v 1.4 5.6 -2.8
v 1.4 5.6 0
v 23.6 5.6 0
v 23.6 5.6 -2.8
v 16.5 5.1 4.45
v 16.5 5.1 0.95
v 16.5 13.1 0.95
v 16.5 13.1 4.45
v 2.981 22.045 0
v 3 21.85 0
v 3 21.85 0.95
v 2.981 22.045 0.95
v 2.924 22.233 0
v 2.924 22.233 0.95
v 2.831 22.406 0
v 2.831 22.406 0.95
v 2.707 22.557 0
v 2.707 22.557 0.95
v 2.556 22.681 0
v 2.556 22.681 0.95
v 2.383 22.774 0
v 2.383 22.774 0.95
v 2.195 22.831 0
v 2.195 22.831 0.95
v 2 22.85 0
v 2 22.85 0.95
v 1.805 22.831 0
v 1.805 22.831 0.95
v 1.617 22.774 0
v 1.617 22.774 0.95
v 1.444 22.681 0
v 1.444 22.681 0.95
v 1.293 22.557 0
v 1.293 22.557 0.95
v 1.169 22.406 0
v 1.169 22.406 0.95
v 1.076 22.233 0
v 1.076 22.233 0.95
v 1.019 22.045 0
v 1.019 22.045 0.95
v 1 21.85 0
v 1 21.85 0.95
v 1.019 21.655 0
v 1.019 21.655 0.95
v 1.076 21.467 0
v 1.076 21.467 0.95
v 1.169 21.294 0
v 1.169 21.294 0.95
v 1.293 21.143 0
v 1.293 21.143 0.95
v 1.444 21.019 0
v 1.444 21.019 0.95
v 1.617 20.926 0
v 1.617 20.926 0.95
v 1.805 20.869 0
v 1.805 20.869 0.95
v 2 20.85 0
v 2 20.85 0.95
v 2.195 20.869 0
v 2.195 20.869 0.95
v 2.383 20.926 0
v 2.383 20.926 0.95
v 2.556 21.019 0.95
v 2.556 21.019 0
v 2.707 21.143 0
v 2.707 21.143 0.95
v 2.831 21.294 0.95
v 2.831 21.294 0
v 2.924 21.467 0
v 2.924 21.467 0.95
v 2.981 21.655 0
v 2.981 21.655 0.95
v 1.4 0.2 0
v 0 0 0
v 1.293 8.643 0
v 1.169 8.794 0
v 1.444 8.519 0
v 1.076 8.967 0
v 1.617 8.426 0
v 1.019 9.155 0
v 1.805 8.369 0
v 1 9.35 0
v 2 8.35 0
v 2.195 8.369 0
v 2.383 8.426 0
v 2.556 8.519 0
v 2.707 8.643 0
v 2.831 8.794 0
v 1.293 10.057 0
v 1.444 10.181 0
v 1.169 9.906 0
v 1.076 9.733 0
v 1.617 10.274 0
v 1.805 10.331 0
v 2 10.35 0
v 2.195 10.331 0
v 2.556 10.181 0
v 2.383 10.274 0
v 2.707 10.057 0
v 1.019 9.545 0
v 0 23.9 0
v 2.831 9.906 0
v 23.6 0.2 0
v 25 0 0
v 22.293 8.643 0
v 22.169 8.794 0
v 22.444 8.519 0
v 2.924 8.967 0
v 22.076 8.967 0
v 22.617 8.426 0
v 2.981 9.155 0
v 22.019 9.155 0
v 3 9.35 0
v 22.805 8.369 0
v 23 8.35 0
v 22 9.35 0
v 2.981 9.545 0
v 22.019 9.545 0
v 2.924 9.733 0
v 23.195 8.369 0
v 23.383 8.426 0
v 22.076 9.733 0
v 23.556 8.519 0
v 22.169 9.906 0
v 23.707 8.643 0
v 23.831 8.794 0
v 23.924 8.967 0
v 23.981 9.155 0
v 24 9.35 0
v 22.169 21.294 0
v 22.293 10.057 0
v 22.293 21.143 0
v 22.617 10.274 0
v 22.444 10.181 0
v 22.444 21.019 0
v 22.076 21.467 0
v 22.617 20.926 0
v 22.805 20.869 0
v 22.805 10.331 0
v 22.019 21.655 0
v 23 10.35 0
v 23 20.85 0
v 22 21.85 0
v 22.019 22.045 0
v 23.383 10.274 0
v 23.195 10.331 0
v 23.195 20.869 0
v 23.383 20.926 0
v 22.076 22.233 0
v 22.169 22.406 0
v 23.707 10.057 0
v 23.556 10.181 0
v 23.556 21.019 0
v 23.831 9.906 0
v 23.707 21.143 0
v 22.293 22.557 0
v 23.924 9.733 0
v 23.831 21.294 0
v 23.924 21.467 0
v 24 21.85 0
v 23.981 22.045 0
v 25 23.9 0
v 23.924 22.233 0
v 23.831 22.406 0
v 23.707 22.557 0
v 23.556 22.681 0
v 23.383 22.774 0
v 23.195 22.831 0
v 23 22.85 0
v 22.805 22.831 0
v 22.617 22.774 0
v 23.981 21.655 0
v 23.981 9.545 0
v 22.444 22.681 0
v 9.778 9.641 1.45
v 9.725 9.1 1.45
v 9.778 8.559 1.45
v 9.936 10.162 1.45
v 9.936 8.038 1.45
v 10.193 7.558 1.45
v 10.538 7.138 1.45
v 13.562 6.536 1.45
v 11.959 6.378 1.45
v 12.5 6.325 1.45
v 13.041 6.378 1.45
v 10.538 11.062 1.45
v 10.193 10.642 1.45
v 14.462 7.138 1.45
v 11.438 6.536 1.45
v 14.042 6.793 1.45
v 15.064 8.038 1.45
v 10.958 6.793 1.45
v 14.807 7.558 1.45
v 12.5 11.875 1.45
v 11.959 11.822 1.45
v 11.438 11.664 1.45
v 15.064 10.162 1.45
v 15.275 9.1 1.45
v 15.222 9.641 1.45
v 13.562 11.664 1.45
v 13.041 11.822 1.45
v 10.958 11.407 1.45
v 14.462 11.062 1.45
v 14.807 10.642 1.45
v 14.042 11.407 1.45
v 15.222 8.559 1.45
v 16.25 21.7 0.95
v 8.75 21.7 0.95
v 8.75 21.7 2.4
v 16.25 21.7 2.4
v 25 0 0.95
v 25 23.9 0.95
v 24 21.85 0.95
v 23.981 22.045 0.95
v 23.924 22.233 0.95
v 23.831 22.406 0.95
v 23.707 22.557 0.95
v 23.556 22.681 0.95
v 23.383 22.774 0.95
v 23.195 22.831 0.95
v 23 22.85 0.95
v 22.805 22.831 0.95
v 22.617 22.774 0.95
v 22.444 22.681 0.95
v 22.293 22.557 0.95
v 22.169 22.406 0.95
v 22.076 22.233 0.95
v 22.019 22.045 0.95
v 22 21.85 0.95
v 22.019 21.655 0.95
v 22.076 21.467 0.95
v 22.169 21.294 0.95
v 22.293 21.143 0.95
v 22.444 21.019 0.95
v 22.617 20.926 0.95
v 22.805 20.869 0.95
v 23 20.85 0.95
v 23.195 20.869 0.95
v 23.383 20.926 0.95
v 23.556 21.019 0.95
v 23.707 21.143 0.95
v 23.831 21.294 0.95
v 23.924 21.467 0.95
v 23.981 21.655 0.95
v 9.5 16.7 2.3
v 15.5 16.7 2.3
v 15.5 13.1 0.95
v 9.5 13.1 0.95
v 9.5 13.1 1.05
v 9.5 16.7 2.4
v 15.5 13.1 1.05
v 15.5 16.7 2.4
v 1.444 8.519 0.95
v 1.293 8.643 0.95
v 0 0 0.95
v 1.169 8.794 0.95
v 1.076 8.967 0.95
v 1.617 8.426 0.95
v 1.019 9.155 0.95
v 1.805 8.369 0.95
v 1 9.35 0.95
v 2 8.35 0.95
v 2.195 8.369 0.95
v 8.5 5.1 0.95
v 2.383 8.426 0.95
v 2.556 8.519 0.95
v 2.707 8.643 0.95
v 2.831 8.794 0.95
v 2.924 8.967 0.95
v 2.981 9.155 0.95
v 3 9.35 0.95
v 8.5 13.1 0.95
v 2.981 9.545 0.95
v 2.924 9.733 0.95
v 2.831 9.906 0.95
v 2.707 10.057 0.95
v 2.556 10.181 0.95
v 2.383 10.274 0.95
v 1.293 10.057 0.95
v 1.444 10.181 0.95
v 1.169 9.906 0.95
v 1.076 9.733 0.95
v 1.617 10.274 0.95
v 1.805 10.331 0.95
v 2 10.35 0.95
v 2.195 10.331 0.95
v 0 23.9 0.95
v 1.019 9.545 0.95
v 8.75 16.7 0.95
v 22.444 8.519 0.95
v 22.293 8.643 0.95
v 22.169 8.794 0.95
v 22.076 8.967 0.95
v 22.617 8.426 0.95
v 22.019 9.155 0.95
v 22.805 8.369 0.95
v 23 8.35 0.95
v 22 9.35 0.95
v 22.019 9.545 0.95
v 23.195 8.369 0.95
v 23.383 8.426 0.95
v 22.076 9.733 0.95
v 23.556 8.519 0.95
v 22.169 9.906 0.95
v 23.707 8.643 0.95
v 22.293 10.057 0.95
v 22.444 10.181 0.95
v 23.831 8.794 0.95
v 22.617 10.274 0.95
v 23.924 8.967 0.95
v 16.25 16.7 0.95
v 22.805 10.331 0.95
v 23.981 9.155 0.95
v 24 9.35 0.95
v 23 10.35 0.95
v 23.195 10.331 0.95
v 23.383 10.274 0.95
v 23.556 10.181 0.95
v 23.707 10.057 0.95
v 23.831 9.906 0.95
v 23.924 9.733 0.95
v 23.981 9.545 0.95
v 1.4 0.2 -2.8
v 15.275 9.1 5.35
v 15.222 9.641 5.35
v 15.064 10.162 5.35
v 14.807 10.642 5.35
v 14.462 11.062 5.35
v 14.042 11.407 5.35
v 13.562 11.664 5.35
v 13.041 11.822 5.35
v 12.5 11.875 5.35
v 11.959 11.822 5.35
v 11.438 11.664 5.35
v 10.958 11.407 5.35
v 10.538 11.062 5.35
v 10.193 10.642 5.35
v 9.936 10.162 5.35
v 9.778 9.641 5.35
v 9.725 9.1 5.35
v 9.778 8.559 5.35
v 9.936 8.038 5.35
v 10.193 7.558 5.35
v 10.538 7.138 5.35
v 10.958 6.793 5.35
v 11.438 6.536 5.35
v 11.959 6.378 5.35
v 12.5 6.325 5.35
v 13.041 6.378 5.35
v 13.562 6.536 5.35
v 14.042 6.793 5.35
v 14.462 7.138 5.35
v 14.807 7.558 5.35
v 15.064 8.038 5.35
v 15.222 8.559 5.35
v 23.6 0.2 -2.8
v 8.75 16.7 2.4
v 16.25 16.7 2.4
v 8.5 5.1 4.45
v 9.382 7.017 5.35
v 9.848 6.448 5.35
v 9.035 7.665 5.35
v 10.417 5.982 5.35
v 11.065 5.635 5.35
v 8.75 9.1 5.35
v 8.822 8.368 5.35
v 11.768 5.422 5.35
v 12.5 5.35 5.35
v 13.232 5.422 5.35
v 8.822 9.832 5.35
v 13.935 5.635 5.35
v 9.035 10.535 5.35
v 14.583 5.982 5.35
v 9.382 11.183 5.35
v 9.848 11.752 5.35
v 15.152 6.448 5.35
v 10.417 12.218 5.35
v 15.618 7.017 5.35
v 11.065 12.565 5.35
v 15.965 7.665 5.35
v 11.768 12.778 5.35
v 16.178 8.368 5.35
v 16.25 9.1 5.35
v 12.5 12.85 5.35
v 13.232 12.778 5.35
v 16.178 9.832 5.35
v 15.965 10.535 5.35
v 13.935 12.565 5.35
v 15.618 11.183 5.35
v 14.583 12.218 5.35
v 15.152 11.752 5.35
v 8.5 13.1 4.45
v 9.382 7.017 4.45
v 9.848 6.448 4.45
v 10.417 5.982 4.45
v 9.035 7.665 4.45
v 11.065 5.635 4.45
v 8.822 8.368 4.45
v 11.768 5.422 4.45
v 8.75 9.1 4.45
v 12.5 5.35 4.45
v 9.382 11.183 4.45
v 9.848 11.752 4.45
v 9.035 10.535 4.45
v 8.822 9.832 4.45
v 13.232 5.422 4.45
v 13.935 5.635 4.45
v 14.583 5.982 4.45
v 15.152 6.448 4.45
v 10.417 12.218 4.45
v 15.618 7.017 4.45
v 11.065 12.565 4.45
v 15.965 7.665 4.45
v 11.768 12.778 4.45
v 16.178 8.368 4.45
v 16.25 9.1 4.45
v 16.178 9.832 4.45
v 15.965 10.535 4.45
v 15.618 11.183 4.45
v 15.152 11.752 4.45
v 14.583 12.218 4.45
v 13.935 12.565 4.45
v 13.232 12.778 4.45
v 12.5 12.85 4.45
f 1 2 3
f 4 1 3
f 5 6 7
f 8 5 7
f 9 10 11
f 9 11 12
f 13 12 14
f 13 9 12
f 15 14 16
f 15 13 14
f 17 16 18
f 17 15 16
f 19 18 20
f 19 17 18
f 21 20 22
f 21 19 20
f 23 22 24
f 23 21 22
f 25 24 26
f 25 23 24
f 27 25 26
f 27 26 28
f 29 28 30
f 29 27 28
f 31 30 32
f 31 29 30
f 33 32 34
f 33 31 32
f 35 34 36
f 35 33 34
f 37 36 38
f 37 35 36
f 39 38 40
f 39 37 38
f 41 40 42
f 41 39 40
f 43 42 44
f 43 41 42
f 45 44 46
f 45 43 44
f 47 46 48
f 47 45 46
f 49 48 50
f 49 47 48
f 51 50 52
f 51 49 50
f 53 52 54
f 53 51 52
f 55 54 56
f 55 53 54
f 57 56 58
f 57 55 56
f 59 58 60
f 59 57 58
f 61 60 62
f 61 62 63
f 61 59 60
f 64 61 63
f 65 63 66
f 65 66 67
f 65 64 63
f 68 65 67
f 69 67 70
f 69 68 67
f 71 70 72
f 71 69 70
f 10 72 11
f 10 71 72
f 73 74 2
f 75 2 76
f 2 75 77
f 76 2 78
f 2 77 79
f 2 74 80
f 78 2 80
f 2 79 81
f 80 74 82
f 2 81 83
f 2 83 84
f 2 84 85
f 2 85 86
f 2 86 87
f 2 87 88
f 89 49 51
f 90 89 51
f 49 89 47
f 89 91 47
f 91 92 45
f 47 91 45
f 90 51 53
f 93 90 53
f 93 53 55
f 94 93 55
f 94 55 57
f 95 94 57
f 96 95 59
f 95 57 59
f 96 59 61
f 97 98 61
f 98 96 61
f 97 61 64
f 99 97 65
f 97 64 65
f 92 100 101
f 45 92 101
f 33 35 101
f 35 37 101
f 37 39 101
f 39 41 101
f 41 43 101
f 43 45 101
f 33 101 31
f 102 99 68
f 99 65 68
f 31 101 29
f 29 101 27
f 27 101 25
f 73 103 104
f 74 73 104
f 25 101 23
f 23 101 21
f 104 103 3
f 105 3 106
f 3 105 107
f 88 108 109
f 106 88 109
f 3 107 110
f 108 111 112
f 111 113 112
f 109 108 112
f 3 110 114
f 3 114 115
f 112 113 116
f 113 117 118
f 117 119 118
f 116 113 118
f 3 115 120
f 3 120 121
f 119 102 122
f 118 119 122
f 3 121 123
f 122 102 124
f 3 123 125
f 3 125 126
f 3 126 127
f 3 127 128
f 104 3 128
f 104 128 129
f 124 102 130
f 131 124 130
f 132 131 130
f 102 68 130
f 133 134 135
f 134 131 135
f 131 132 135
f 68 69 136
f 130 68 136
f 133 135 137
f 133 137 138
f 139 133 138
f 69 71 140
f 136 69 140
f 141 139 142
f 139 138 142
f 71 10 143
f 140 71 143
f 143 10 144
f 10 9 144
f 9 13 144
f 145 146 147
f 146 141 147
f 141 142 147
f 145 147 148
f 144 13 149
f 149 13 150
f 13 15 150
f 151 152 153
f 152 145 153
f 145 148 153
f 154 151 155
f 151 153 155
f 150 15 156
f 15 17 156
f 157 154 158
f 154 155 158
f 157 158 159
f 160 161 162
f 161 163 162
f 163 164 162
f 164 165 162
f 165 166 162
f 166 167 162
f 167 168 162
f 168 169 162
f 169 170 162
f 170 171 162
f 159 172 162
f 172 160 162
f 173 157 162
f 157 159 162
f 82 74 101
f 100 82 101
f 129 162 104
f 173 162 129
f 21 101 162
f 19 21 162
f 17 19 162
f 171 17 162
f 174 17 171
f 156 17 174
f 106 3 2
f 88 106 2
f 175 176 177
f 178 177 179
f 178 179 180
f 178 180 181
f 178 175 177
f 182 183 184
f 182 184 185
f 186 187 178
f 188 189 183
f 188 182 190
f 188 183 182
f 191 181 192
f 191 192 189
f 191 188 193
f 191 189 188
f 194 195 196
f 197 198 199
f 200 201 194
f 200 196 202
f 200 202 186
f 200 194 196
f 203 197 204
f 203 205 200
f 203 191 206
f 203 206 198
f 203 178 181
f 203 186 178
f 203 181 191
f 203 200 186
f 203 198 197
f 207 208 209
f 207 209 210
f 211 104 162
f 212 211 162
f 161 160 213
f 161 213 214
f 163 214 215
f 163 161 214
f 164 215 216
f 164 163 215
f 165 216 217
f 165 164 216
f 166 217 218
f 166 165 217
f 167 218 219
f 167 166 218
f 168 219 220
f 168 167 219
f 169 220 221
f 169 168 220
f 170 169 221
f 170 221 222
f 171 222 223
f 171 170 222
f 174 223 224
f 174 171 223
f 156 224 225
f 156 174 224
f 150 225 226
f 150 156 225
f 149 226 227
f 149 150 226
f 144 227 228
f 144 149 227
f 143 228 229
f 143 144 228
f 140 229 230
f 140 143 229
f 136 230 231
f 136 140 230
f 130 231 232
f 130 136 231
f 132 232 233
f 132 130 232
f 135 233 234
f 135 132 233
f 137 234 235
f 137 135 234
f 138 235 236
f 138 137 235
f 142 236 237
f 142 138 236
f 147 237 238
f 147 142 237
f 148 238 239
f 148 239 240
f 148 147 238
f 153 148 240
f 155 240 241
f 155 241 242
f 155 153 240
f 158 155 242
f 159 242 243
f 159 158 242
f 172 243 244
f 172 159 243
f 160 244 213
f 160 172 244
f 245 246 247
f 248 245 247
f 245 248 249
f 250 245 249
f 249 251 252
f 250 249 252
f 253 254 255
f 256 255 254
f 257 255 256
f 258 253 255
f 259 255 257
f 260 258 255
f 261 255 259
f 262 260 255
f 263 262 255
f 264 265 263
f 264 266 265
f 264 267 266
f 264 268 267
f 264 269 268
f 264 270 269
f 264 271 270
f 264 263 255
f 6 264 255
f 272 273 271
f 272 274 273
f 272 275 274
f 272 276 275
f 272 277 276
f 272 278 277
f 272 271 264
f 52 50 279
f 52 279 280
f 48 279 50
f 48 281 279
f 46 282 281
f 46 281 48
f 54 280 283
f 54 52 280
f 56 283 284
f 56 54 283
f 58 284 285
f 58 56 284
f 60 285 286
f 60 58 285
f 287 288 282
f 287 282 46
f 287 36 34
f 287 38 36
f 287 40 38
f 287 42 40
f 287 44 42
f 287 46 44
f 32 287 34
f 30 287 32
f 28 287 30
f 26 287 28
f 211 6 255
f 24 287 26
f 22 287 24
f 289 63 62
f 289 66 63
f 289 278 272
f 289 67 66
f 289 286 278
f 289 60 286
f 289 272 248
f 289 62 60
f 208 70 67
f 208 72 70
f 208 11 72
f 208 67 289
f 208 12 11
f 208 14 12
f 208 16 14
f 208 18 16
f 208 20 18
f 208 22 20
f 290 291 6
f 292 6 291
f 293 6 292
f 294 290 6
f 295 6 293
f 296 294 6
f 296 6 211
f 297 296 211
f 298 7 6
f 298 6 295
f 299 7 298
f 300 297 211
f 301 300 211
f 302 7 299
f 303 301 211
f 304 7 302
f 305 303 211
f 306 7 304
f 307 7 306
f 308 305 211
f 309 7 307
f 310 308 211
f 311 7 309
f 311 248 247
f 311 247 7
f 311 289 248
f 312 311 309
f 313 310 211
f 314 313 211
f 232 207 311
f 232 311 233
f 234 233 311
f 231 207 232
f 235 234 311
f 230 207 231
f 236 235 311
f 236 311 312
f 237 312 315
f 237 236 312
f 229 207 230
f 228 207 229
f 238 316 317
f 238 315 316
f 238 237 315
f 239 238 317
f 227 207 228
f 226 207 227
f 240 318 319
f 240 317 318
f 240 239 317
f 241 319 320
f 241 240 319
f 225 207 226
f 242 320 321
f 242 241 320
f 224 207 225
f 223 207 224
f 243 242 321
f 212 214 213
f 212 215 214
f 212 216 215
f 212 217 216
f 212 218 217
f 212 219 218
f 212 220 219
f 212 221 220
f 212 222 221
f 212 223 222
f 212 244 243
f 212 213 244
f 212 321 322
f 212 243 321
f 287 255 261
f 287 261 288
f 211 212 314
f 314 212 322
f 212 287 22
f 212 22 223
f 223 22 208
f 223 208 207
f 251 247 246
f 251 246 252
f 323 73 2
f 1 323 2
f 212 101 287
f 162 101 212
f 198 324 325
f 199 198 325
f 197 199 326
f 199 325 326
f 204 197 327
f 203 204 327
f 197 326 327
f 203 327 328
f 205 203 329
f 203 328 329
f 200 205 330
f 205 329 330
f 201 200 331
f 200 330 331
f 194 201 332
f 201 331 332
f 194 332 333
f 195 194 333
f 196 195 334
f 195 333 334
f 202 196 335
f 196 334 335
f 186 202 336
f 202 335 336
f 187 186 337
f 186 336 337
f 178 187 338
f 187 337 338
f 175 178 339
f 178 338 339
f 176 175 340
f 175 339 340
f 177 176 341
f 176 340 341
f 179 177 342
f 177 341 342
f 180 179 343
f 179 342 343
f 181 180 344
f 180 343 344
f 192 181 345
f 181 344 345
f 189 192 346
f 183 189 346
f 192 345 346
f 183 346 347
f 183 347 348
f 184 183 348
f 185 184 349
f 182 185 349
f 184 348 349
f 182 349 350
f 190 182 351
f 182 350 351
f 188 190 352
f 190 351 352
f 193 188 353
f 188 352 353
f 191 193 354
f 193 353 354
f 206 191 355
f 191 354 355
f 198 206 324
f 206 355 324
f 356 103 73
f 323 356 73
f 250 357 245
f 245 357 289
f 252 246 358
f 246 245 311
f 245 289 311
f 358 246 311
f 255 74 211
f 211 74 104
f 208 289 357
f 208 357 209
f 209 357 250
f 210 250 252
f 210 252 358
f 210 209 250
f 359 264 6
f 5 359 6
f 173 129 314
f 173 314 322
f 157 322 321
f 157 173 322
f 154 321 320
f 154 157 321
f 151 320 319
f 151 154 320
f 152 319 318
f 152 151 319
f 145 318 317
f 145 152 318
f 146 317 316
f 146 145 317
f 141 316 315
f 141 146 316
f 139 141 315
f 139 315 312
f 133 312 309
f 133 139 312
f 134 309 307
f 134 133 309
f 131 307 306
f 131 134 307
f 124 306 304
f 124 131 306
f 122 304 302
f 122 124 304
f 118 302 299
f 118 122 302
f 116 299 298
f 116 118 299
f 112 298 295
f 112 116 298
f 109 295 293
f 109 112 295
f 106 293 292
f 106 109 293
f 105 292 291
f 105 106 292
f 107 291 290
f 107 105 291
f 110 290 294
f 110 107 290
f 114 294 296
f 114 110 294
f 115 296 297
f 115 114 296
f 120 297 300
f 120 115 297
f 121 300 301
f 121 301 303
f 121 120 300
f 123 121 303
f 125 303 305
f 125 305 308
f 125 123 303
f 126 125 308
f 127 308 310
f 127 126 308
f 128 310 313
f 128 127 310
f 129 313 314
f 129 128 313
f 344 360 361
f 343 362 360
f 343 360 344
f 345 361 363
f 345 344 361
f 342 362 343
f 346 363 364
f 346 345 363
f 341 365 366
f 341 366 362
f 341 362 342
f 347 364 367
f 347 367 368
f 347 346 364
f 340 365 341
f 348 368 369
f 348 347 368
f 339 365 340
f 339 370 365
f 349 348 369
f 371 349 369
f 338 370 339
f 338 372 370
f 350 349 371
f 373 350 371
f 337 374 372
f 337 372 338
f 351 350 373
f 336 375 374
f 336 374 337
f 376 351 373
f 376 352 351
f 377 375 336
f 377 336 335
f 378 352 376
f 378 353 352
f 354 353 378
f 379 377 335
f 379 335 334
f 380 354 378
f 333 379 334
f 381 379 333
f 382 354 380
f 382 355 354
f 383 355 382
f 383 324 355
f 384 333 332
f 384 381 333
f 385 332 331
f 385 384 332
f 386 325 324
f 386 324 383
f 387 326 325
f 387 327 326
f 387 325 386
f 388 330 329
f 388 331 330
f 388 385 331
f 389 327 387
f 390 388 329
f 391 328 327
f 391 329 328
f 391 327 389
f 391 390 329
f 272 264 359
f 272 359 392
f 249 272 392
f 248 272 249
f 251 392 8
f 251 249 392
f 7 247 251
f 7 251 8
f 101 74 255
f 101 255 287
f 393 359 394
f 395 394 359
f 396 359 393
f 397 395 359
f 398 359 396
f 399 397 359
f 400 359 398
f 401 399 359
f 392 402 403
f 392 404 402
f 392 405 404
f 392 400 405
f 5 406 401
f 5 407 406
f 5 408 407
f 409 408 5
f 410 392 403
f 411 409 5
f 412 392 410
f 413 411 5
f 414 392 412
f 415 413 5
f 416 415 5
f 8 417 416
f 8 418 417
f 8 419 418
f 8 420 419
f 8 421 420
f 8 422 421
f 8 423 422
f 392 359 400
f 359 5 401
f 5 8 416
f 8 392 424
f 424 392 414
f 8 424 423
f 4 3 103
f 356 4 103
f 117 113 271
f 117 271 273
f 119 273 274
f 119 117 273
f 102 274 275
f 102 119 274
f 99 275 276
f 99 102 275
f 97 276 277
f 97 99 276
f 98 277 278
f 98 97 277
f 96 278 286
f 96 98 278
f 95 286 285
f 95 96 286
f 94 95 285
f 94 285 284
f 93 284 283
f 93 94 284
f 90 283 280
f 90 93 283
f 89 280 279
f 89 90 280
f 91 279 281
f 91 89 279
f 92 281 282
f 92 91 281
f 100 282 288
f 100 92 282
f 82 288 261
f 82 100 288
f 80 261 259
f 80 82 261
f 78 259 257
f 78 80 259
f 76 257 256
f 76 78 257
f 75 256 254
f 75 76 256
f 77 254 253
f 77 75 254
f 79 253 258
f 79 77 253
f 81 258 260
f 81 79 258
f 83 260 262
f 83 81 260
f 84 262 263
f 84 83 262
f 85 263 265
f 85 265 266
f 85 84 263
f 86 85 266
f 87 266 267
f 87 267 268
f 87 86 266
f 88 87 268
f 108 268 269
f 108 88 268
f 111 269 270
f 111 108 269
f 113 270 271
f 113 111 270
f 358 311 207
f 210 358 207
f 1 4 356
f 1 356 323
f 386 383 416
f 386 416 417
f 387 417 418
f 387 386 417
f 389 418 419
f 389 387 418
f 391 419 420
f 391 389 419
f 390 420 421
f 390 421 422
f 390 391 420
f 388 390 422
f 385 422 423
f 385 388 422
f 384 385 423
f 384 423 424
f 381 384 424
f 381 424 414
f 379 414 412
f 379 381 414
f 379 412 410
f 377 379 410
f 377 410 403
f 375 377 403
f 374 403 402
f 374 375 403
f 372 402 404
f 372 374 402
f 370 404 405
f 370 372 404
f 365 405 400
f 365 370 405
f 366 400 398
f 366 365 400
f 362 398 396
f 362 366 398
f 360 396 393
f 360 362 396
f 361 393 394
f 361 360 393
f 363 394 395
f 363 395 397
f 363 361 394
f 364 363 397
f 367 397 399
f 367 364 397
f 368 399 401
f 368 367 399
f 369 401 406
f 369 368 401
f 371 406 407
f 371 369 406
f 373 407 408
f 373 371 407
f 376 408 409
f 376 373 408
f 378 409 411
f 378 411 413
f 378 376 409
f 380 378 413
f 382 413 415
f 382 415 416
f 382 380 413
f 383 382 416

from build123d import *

# Parameters (mm, degrees)
SKETCH1_W           = 25
SKETCH1_H           = 23.9
SKETCH1_R           = 1
BOSS_EXTRUDE1_DEPTH = 0.95
SKETCH2_W           = 7.5
SKETCH2_H           = 5
BOSS_EXTRUDE2_DEPTH = 1.45
SKETCH3_W           = 8
SKETCH3_H           = 8
BOSS_EXTRUDE3_DEPTH = 4.4
SKETCH4_W           = 8
SKETCH4_H           = 8
SKETCH4_R           = 3.75
CUT_EXTRUDE1_DEPTH  = 0.9
SKETCH5_R           = 2.775
CUT_EXTRUDE2_DEPTH  = 3.9
BOSS_EXTRUDE4_DEPTH = 6
BOSS_EXTRUDE5_DEPTH = 2.8


with BuildPart() as part:
    # Sketch1 → Boss-Extrude1 (new body)
    with BuildSketch(Plane.XY):
        with Locations((12.5, 11.95)):
            Rectangle(SKETCH1_W, SKETCH1_H)
        with Locations((23, 9.35)):
            Circle(SKETCH1_R, mode=Mode.SUBTRACT)
        with Locations((2, 9.35)):
            Circle(SKETCH1_R, mode=Mode.SUBTRACT)
        with Locations((23, 21.85)):
            Circle(SKETCH1_R, mode=Mode.SUBTRACT)
        with Locations((2, 21.85)):
            Circle(SKETCH1_R, mode=Mode.SUBTRACT)
    extrude(amount=BOSS_EXTRUDE1_DEPTH)

    # Sketch2 → Boss-Extrude2 (add)
    with BuildSketch(Plane.XY.offset(0.95)):
        with Locations((12.5, 19.2)):
            Rectangle(SKETCH2_W, SKETCH2_H)
    extrude(amount=BOSS_EXTRUDE2_DEPTH)

    # Sketch3 → Boss-Extrude3 (add)
    with BuildSketch(Plane.XY.offset(0.95)):
        with Locations((12.5, 9.1)):
            Rectangle(SKETCH3_W, SKETCH3_H)
    extrude(amount=BOSS_EXTRUDE3_DEPTH)

    # Sketch4 → Cut-Extrude1 (cut)
    with BuildSketch(Plane.XY.offset(5.35)):
        with Locations((12.5, 9.1)):
            Rectangle(SKETCH4_W, SKETCH4_H)
        with Locations((12.5, 9.1)):
            Circle(SKETCH4_R, mode=Mode.SUBTRACT)
    extrude(amount=-CUT_EXTRUDE1_DEPTH, mode=Mode.SUBTRACT)

    # Sketch5 → Cut-Extrude2 (cut)
    with BuildSketch(Plane.XY.offset(5.35)):
        with Locations((12.5, 9.1)):
            Circle(SKETCH5_R)
    extrude(amount=-CUT_EXTRUDE2_DEPTH, mode=Mode.SUBTRACT)

    # Sketch12 → Boss-Extrude4 (add)
    with BuildSketch(Plane(origin=(15.5, 0, 0), x_dir=(0, 0, -1), z_dir=(1, 0, 0))):
        Polygon((-2.4, 16.7), (-2.3, 16.7), (-0.95, 13.1), (-1.05, 13.1), align=None)
    extrude(amount=-BOSS_EXTRUDE4_DEPTH)

    # Sketch13 → Boss-Extrude5 (add)
    with BuildSketch(Plane(origin=(0, 0, 0), x_dir=(-1, 0, 0), z_dir=(0, 0, -1))):
        Polygon((-1.4, 5.6), (-12.5, 5.6), (-23.6, 5.6), (-23.6, 0.2), (-1.4, 0.2), align=None)
    extrude(amount=BOSS_EXTRUDE5_DEPTH)


solid = part.part
